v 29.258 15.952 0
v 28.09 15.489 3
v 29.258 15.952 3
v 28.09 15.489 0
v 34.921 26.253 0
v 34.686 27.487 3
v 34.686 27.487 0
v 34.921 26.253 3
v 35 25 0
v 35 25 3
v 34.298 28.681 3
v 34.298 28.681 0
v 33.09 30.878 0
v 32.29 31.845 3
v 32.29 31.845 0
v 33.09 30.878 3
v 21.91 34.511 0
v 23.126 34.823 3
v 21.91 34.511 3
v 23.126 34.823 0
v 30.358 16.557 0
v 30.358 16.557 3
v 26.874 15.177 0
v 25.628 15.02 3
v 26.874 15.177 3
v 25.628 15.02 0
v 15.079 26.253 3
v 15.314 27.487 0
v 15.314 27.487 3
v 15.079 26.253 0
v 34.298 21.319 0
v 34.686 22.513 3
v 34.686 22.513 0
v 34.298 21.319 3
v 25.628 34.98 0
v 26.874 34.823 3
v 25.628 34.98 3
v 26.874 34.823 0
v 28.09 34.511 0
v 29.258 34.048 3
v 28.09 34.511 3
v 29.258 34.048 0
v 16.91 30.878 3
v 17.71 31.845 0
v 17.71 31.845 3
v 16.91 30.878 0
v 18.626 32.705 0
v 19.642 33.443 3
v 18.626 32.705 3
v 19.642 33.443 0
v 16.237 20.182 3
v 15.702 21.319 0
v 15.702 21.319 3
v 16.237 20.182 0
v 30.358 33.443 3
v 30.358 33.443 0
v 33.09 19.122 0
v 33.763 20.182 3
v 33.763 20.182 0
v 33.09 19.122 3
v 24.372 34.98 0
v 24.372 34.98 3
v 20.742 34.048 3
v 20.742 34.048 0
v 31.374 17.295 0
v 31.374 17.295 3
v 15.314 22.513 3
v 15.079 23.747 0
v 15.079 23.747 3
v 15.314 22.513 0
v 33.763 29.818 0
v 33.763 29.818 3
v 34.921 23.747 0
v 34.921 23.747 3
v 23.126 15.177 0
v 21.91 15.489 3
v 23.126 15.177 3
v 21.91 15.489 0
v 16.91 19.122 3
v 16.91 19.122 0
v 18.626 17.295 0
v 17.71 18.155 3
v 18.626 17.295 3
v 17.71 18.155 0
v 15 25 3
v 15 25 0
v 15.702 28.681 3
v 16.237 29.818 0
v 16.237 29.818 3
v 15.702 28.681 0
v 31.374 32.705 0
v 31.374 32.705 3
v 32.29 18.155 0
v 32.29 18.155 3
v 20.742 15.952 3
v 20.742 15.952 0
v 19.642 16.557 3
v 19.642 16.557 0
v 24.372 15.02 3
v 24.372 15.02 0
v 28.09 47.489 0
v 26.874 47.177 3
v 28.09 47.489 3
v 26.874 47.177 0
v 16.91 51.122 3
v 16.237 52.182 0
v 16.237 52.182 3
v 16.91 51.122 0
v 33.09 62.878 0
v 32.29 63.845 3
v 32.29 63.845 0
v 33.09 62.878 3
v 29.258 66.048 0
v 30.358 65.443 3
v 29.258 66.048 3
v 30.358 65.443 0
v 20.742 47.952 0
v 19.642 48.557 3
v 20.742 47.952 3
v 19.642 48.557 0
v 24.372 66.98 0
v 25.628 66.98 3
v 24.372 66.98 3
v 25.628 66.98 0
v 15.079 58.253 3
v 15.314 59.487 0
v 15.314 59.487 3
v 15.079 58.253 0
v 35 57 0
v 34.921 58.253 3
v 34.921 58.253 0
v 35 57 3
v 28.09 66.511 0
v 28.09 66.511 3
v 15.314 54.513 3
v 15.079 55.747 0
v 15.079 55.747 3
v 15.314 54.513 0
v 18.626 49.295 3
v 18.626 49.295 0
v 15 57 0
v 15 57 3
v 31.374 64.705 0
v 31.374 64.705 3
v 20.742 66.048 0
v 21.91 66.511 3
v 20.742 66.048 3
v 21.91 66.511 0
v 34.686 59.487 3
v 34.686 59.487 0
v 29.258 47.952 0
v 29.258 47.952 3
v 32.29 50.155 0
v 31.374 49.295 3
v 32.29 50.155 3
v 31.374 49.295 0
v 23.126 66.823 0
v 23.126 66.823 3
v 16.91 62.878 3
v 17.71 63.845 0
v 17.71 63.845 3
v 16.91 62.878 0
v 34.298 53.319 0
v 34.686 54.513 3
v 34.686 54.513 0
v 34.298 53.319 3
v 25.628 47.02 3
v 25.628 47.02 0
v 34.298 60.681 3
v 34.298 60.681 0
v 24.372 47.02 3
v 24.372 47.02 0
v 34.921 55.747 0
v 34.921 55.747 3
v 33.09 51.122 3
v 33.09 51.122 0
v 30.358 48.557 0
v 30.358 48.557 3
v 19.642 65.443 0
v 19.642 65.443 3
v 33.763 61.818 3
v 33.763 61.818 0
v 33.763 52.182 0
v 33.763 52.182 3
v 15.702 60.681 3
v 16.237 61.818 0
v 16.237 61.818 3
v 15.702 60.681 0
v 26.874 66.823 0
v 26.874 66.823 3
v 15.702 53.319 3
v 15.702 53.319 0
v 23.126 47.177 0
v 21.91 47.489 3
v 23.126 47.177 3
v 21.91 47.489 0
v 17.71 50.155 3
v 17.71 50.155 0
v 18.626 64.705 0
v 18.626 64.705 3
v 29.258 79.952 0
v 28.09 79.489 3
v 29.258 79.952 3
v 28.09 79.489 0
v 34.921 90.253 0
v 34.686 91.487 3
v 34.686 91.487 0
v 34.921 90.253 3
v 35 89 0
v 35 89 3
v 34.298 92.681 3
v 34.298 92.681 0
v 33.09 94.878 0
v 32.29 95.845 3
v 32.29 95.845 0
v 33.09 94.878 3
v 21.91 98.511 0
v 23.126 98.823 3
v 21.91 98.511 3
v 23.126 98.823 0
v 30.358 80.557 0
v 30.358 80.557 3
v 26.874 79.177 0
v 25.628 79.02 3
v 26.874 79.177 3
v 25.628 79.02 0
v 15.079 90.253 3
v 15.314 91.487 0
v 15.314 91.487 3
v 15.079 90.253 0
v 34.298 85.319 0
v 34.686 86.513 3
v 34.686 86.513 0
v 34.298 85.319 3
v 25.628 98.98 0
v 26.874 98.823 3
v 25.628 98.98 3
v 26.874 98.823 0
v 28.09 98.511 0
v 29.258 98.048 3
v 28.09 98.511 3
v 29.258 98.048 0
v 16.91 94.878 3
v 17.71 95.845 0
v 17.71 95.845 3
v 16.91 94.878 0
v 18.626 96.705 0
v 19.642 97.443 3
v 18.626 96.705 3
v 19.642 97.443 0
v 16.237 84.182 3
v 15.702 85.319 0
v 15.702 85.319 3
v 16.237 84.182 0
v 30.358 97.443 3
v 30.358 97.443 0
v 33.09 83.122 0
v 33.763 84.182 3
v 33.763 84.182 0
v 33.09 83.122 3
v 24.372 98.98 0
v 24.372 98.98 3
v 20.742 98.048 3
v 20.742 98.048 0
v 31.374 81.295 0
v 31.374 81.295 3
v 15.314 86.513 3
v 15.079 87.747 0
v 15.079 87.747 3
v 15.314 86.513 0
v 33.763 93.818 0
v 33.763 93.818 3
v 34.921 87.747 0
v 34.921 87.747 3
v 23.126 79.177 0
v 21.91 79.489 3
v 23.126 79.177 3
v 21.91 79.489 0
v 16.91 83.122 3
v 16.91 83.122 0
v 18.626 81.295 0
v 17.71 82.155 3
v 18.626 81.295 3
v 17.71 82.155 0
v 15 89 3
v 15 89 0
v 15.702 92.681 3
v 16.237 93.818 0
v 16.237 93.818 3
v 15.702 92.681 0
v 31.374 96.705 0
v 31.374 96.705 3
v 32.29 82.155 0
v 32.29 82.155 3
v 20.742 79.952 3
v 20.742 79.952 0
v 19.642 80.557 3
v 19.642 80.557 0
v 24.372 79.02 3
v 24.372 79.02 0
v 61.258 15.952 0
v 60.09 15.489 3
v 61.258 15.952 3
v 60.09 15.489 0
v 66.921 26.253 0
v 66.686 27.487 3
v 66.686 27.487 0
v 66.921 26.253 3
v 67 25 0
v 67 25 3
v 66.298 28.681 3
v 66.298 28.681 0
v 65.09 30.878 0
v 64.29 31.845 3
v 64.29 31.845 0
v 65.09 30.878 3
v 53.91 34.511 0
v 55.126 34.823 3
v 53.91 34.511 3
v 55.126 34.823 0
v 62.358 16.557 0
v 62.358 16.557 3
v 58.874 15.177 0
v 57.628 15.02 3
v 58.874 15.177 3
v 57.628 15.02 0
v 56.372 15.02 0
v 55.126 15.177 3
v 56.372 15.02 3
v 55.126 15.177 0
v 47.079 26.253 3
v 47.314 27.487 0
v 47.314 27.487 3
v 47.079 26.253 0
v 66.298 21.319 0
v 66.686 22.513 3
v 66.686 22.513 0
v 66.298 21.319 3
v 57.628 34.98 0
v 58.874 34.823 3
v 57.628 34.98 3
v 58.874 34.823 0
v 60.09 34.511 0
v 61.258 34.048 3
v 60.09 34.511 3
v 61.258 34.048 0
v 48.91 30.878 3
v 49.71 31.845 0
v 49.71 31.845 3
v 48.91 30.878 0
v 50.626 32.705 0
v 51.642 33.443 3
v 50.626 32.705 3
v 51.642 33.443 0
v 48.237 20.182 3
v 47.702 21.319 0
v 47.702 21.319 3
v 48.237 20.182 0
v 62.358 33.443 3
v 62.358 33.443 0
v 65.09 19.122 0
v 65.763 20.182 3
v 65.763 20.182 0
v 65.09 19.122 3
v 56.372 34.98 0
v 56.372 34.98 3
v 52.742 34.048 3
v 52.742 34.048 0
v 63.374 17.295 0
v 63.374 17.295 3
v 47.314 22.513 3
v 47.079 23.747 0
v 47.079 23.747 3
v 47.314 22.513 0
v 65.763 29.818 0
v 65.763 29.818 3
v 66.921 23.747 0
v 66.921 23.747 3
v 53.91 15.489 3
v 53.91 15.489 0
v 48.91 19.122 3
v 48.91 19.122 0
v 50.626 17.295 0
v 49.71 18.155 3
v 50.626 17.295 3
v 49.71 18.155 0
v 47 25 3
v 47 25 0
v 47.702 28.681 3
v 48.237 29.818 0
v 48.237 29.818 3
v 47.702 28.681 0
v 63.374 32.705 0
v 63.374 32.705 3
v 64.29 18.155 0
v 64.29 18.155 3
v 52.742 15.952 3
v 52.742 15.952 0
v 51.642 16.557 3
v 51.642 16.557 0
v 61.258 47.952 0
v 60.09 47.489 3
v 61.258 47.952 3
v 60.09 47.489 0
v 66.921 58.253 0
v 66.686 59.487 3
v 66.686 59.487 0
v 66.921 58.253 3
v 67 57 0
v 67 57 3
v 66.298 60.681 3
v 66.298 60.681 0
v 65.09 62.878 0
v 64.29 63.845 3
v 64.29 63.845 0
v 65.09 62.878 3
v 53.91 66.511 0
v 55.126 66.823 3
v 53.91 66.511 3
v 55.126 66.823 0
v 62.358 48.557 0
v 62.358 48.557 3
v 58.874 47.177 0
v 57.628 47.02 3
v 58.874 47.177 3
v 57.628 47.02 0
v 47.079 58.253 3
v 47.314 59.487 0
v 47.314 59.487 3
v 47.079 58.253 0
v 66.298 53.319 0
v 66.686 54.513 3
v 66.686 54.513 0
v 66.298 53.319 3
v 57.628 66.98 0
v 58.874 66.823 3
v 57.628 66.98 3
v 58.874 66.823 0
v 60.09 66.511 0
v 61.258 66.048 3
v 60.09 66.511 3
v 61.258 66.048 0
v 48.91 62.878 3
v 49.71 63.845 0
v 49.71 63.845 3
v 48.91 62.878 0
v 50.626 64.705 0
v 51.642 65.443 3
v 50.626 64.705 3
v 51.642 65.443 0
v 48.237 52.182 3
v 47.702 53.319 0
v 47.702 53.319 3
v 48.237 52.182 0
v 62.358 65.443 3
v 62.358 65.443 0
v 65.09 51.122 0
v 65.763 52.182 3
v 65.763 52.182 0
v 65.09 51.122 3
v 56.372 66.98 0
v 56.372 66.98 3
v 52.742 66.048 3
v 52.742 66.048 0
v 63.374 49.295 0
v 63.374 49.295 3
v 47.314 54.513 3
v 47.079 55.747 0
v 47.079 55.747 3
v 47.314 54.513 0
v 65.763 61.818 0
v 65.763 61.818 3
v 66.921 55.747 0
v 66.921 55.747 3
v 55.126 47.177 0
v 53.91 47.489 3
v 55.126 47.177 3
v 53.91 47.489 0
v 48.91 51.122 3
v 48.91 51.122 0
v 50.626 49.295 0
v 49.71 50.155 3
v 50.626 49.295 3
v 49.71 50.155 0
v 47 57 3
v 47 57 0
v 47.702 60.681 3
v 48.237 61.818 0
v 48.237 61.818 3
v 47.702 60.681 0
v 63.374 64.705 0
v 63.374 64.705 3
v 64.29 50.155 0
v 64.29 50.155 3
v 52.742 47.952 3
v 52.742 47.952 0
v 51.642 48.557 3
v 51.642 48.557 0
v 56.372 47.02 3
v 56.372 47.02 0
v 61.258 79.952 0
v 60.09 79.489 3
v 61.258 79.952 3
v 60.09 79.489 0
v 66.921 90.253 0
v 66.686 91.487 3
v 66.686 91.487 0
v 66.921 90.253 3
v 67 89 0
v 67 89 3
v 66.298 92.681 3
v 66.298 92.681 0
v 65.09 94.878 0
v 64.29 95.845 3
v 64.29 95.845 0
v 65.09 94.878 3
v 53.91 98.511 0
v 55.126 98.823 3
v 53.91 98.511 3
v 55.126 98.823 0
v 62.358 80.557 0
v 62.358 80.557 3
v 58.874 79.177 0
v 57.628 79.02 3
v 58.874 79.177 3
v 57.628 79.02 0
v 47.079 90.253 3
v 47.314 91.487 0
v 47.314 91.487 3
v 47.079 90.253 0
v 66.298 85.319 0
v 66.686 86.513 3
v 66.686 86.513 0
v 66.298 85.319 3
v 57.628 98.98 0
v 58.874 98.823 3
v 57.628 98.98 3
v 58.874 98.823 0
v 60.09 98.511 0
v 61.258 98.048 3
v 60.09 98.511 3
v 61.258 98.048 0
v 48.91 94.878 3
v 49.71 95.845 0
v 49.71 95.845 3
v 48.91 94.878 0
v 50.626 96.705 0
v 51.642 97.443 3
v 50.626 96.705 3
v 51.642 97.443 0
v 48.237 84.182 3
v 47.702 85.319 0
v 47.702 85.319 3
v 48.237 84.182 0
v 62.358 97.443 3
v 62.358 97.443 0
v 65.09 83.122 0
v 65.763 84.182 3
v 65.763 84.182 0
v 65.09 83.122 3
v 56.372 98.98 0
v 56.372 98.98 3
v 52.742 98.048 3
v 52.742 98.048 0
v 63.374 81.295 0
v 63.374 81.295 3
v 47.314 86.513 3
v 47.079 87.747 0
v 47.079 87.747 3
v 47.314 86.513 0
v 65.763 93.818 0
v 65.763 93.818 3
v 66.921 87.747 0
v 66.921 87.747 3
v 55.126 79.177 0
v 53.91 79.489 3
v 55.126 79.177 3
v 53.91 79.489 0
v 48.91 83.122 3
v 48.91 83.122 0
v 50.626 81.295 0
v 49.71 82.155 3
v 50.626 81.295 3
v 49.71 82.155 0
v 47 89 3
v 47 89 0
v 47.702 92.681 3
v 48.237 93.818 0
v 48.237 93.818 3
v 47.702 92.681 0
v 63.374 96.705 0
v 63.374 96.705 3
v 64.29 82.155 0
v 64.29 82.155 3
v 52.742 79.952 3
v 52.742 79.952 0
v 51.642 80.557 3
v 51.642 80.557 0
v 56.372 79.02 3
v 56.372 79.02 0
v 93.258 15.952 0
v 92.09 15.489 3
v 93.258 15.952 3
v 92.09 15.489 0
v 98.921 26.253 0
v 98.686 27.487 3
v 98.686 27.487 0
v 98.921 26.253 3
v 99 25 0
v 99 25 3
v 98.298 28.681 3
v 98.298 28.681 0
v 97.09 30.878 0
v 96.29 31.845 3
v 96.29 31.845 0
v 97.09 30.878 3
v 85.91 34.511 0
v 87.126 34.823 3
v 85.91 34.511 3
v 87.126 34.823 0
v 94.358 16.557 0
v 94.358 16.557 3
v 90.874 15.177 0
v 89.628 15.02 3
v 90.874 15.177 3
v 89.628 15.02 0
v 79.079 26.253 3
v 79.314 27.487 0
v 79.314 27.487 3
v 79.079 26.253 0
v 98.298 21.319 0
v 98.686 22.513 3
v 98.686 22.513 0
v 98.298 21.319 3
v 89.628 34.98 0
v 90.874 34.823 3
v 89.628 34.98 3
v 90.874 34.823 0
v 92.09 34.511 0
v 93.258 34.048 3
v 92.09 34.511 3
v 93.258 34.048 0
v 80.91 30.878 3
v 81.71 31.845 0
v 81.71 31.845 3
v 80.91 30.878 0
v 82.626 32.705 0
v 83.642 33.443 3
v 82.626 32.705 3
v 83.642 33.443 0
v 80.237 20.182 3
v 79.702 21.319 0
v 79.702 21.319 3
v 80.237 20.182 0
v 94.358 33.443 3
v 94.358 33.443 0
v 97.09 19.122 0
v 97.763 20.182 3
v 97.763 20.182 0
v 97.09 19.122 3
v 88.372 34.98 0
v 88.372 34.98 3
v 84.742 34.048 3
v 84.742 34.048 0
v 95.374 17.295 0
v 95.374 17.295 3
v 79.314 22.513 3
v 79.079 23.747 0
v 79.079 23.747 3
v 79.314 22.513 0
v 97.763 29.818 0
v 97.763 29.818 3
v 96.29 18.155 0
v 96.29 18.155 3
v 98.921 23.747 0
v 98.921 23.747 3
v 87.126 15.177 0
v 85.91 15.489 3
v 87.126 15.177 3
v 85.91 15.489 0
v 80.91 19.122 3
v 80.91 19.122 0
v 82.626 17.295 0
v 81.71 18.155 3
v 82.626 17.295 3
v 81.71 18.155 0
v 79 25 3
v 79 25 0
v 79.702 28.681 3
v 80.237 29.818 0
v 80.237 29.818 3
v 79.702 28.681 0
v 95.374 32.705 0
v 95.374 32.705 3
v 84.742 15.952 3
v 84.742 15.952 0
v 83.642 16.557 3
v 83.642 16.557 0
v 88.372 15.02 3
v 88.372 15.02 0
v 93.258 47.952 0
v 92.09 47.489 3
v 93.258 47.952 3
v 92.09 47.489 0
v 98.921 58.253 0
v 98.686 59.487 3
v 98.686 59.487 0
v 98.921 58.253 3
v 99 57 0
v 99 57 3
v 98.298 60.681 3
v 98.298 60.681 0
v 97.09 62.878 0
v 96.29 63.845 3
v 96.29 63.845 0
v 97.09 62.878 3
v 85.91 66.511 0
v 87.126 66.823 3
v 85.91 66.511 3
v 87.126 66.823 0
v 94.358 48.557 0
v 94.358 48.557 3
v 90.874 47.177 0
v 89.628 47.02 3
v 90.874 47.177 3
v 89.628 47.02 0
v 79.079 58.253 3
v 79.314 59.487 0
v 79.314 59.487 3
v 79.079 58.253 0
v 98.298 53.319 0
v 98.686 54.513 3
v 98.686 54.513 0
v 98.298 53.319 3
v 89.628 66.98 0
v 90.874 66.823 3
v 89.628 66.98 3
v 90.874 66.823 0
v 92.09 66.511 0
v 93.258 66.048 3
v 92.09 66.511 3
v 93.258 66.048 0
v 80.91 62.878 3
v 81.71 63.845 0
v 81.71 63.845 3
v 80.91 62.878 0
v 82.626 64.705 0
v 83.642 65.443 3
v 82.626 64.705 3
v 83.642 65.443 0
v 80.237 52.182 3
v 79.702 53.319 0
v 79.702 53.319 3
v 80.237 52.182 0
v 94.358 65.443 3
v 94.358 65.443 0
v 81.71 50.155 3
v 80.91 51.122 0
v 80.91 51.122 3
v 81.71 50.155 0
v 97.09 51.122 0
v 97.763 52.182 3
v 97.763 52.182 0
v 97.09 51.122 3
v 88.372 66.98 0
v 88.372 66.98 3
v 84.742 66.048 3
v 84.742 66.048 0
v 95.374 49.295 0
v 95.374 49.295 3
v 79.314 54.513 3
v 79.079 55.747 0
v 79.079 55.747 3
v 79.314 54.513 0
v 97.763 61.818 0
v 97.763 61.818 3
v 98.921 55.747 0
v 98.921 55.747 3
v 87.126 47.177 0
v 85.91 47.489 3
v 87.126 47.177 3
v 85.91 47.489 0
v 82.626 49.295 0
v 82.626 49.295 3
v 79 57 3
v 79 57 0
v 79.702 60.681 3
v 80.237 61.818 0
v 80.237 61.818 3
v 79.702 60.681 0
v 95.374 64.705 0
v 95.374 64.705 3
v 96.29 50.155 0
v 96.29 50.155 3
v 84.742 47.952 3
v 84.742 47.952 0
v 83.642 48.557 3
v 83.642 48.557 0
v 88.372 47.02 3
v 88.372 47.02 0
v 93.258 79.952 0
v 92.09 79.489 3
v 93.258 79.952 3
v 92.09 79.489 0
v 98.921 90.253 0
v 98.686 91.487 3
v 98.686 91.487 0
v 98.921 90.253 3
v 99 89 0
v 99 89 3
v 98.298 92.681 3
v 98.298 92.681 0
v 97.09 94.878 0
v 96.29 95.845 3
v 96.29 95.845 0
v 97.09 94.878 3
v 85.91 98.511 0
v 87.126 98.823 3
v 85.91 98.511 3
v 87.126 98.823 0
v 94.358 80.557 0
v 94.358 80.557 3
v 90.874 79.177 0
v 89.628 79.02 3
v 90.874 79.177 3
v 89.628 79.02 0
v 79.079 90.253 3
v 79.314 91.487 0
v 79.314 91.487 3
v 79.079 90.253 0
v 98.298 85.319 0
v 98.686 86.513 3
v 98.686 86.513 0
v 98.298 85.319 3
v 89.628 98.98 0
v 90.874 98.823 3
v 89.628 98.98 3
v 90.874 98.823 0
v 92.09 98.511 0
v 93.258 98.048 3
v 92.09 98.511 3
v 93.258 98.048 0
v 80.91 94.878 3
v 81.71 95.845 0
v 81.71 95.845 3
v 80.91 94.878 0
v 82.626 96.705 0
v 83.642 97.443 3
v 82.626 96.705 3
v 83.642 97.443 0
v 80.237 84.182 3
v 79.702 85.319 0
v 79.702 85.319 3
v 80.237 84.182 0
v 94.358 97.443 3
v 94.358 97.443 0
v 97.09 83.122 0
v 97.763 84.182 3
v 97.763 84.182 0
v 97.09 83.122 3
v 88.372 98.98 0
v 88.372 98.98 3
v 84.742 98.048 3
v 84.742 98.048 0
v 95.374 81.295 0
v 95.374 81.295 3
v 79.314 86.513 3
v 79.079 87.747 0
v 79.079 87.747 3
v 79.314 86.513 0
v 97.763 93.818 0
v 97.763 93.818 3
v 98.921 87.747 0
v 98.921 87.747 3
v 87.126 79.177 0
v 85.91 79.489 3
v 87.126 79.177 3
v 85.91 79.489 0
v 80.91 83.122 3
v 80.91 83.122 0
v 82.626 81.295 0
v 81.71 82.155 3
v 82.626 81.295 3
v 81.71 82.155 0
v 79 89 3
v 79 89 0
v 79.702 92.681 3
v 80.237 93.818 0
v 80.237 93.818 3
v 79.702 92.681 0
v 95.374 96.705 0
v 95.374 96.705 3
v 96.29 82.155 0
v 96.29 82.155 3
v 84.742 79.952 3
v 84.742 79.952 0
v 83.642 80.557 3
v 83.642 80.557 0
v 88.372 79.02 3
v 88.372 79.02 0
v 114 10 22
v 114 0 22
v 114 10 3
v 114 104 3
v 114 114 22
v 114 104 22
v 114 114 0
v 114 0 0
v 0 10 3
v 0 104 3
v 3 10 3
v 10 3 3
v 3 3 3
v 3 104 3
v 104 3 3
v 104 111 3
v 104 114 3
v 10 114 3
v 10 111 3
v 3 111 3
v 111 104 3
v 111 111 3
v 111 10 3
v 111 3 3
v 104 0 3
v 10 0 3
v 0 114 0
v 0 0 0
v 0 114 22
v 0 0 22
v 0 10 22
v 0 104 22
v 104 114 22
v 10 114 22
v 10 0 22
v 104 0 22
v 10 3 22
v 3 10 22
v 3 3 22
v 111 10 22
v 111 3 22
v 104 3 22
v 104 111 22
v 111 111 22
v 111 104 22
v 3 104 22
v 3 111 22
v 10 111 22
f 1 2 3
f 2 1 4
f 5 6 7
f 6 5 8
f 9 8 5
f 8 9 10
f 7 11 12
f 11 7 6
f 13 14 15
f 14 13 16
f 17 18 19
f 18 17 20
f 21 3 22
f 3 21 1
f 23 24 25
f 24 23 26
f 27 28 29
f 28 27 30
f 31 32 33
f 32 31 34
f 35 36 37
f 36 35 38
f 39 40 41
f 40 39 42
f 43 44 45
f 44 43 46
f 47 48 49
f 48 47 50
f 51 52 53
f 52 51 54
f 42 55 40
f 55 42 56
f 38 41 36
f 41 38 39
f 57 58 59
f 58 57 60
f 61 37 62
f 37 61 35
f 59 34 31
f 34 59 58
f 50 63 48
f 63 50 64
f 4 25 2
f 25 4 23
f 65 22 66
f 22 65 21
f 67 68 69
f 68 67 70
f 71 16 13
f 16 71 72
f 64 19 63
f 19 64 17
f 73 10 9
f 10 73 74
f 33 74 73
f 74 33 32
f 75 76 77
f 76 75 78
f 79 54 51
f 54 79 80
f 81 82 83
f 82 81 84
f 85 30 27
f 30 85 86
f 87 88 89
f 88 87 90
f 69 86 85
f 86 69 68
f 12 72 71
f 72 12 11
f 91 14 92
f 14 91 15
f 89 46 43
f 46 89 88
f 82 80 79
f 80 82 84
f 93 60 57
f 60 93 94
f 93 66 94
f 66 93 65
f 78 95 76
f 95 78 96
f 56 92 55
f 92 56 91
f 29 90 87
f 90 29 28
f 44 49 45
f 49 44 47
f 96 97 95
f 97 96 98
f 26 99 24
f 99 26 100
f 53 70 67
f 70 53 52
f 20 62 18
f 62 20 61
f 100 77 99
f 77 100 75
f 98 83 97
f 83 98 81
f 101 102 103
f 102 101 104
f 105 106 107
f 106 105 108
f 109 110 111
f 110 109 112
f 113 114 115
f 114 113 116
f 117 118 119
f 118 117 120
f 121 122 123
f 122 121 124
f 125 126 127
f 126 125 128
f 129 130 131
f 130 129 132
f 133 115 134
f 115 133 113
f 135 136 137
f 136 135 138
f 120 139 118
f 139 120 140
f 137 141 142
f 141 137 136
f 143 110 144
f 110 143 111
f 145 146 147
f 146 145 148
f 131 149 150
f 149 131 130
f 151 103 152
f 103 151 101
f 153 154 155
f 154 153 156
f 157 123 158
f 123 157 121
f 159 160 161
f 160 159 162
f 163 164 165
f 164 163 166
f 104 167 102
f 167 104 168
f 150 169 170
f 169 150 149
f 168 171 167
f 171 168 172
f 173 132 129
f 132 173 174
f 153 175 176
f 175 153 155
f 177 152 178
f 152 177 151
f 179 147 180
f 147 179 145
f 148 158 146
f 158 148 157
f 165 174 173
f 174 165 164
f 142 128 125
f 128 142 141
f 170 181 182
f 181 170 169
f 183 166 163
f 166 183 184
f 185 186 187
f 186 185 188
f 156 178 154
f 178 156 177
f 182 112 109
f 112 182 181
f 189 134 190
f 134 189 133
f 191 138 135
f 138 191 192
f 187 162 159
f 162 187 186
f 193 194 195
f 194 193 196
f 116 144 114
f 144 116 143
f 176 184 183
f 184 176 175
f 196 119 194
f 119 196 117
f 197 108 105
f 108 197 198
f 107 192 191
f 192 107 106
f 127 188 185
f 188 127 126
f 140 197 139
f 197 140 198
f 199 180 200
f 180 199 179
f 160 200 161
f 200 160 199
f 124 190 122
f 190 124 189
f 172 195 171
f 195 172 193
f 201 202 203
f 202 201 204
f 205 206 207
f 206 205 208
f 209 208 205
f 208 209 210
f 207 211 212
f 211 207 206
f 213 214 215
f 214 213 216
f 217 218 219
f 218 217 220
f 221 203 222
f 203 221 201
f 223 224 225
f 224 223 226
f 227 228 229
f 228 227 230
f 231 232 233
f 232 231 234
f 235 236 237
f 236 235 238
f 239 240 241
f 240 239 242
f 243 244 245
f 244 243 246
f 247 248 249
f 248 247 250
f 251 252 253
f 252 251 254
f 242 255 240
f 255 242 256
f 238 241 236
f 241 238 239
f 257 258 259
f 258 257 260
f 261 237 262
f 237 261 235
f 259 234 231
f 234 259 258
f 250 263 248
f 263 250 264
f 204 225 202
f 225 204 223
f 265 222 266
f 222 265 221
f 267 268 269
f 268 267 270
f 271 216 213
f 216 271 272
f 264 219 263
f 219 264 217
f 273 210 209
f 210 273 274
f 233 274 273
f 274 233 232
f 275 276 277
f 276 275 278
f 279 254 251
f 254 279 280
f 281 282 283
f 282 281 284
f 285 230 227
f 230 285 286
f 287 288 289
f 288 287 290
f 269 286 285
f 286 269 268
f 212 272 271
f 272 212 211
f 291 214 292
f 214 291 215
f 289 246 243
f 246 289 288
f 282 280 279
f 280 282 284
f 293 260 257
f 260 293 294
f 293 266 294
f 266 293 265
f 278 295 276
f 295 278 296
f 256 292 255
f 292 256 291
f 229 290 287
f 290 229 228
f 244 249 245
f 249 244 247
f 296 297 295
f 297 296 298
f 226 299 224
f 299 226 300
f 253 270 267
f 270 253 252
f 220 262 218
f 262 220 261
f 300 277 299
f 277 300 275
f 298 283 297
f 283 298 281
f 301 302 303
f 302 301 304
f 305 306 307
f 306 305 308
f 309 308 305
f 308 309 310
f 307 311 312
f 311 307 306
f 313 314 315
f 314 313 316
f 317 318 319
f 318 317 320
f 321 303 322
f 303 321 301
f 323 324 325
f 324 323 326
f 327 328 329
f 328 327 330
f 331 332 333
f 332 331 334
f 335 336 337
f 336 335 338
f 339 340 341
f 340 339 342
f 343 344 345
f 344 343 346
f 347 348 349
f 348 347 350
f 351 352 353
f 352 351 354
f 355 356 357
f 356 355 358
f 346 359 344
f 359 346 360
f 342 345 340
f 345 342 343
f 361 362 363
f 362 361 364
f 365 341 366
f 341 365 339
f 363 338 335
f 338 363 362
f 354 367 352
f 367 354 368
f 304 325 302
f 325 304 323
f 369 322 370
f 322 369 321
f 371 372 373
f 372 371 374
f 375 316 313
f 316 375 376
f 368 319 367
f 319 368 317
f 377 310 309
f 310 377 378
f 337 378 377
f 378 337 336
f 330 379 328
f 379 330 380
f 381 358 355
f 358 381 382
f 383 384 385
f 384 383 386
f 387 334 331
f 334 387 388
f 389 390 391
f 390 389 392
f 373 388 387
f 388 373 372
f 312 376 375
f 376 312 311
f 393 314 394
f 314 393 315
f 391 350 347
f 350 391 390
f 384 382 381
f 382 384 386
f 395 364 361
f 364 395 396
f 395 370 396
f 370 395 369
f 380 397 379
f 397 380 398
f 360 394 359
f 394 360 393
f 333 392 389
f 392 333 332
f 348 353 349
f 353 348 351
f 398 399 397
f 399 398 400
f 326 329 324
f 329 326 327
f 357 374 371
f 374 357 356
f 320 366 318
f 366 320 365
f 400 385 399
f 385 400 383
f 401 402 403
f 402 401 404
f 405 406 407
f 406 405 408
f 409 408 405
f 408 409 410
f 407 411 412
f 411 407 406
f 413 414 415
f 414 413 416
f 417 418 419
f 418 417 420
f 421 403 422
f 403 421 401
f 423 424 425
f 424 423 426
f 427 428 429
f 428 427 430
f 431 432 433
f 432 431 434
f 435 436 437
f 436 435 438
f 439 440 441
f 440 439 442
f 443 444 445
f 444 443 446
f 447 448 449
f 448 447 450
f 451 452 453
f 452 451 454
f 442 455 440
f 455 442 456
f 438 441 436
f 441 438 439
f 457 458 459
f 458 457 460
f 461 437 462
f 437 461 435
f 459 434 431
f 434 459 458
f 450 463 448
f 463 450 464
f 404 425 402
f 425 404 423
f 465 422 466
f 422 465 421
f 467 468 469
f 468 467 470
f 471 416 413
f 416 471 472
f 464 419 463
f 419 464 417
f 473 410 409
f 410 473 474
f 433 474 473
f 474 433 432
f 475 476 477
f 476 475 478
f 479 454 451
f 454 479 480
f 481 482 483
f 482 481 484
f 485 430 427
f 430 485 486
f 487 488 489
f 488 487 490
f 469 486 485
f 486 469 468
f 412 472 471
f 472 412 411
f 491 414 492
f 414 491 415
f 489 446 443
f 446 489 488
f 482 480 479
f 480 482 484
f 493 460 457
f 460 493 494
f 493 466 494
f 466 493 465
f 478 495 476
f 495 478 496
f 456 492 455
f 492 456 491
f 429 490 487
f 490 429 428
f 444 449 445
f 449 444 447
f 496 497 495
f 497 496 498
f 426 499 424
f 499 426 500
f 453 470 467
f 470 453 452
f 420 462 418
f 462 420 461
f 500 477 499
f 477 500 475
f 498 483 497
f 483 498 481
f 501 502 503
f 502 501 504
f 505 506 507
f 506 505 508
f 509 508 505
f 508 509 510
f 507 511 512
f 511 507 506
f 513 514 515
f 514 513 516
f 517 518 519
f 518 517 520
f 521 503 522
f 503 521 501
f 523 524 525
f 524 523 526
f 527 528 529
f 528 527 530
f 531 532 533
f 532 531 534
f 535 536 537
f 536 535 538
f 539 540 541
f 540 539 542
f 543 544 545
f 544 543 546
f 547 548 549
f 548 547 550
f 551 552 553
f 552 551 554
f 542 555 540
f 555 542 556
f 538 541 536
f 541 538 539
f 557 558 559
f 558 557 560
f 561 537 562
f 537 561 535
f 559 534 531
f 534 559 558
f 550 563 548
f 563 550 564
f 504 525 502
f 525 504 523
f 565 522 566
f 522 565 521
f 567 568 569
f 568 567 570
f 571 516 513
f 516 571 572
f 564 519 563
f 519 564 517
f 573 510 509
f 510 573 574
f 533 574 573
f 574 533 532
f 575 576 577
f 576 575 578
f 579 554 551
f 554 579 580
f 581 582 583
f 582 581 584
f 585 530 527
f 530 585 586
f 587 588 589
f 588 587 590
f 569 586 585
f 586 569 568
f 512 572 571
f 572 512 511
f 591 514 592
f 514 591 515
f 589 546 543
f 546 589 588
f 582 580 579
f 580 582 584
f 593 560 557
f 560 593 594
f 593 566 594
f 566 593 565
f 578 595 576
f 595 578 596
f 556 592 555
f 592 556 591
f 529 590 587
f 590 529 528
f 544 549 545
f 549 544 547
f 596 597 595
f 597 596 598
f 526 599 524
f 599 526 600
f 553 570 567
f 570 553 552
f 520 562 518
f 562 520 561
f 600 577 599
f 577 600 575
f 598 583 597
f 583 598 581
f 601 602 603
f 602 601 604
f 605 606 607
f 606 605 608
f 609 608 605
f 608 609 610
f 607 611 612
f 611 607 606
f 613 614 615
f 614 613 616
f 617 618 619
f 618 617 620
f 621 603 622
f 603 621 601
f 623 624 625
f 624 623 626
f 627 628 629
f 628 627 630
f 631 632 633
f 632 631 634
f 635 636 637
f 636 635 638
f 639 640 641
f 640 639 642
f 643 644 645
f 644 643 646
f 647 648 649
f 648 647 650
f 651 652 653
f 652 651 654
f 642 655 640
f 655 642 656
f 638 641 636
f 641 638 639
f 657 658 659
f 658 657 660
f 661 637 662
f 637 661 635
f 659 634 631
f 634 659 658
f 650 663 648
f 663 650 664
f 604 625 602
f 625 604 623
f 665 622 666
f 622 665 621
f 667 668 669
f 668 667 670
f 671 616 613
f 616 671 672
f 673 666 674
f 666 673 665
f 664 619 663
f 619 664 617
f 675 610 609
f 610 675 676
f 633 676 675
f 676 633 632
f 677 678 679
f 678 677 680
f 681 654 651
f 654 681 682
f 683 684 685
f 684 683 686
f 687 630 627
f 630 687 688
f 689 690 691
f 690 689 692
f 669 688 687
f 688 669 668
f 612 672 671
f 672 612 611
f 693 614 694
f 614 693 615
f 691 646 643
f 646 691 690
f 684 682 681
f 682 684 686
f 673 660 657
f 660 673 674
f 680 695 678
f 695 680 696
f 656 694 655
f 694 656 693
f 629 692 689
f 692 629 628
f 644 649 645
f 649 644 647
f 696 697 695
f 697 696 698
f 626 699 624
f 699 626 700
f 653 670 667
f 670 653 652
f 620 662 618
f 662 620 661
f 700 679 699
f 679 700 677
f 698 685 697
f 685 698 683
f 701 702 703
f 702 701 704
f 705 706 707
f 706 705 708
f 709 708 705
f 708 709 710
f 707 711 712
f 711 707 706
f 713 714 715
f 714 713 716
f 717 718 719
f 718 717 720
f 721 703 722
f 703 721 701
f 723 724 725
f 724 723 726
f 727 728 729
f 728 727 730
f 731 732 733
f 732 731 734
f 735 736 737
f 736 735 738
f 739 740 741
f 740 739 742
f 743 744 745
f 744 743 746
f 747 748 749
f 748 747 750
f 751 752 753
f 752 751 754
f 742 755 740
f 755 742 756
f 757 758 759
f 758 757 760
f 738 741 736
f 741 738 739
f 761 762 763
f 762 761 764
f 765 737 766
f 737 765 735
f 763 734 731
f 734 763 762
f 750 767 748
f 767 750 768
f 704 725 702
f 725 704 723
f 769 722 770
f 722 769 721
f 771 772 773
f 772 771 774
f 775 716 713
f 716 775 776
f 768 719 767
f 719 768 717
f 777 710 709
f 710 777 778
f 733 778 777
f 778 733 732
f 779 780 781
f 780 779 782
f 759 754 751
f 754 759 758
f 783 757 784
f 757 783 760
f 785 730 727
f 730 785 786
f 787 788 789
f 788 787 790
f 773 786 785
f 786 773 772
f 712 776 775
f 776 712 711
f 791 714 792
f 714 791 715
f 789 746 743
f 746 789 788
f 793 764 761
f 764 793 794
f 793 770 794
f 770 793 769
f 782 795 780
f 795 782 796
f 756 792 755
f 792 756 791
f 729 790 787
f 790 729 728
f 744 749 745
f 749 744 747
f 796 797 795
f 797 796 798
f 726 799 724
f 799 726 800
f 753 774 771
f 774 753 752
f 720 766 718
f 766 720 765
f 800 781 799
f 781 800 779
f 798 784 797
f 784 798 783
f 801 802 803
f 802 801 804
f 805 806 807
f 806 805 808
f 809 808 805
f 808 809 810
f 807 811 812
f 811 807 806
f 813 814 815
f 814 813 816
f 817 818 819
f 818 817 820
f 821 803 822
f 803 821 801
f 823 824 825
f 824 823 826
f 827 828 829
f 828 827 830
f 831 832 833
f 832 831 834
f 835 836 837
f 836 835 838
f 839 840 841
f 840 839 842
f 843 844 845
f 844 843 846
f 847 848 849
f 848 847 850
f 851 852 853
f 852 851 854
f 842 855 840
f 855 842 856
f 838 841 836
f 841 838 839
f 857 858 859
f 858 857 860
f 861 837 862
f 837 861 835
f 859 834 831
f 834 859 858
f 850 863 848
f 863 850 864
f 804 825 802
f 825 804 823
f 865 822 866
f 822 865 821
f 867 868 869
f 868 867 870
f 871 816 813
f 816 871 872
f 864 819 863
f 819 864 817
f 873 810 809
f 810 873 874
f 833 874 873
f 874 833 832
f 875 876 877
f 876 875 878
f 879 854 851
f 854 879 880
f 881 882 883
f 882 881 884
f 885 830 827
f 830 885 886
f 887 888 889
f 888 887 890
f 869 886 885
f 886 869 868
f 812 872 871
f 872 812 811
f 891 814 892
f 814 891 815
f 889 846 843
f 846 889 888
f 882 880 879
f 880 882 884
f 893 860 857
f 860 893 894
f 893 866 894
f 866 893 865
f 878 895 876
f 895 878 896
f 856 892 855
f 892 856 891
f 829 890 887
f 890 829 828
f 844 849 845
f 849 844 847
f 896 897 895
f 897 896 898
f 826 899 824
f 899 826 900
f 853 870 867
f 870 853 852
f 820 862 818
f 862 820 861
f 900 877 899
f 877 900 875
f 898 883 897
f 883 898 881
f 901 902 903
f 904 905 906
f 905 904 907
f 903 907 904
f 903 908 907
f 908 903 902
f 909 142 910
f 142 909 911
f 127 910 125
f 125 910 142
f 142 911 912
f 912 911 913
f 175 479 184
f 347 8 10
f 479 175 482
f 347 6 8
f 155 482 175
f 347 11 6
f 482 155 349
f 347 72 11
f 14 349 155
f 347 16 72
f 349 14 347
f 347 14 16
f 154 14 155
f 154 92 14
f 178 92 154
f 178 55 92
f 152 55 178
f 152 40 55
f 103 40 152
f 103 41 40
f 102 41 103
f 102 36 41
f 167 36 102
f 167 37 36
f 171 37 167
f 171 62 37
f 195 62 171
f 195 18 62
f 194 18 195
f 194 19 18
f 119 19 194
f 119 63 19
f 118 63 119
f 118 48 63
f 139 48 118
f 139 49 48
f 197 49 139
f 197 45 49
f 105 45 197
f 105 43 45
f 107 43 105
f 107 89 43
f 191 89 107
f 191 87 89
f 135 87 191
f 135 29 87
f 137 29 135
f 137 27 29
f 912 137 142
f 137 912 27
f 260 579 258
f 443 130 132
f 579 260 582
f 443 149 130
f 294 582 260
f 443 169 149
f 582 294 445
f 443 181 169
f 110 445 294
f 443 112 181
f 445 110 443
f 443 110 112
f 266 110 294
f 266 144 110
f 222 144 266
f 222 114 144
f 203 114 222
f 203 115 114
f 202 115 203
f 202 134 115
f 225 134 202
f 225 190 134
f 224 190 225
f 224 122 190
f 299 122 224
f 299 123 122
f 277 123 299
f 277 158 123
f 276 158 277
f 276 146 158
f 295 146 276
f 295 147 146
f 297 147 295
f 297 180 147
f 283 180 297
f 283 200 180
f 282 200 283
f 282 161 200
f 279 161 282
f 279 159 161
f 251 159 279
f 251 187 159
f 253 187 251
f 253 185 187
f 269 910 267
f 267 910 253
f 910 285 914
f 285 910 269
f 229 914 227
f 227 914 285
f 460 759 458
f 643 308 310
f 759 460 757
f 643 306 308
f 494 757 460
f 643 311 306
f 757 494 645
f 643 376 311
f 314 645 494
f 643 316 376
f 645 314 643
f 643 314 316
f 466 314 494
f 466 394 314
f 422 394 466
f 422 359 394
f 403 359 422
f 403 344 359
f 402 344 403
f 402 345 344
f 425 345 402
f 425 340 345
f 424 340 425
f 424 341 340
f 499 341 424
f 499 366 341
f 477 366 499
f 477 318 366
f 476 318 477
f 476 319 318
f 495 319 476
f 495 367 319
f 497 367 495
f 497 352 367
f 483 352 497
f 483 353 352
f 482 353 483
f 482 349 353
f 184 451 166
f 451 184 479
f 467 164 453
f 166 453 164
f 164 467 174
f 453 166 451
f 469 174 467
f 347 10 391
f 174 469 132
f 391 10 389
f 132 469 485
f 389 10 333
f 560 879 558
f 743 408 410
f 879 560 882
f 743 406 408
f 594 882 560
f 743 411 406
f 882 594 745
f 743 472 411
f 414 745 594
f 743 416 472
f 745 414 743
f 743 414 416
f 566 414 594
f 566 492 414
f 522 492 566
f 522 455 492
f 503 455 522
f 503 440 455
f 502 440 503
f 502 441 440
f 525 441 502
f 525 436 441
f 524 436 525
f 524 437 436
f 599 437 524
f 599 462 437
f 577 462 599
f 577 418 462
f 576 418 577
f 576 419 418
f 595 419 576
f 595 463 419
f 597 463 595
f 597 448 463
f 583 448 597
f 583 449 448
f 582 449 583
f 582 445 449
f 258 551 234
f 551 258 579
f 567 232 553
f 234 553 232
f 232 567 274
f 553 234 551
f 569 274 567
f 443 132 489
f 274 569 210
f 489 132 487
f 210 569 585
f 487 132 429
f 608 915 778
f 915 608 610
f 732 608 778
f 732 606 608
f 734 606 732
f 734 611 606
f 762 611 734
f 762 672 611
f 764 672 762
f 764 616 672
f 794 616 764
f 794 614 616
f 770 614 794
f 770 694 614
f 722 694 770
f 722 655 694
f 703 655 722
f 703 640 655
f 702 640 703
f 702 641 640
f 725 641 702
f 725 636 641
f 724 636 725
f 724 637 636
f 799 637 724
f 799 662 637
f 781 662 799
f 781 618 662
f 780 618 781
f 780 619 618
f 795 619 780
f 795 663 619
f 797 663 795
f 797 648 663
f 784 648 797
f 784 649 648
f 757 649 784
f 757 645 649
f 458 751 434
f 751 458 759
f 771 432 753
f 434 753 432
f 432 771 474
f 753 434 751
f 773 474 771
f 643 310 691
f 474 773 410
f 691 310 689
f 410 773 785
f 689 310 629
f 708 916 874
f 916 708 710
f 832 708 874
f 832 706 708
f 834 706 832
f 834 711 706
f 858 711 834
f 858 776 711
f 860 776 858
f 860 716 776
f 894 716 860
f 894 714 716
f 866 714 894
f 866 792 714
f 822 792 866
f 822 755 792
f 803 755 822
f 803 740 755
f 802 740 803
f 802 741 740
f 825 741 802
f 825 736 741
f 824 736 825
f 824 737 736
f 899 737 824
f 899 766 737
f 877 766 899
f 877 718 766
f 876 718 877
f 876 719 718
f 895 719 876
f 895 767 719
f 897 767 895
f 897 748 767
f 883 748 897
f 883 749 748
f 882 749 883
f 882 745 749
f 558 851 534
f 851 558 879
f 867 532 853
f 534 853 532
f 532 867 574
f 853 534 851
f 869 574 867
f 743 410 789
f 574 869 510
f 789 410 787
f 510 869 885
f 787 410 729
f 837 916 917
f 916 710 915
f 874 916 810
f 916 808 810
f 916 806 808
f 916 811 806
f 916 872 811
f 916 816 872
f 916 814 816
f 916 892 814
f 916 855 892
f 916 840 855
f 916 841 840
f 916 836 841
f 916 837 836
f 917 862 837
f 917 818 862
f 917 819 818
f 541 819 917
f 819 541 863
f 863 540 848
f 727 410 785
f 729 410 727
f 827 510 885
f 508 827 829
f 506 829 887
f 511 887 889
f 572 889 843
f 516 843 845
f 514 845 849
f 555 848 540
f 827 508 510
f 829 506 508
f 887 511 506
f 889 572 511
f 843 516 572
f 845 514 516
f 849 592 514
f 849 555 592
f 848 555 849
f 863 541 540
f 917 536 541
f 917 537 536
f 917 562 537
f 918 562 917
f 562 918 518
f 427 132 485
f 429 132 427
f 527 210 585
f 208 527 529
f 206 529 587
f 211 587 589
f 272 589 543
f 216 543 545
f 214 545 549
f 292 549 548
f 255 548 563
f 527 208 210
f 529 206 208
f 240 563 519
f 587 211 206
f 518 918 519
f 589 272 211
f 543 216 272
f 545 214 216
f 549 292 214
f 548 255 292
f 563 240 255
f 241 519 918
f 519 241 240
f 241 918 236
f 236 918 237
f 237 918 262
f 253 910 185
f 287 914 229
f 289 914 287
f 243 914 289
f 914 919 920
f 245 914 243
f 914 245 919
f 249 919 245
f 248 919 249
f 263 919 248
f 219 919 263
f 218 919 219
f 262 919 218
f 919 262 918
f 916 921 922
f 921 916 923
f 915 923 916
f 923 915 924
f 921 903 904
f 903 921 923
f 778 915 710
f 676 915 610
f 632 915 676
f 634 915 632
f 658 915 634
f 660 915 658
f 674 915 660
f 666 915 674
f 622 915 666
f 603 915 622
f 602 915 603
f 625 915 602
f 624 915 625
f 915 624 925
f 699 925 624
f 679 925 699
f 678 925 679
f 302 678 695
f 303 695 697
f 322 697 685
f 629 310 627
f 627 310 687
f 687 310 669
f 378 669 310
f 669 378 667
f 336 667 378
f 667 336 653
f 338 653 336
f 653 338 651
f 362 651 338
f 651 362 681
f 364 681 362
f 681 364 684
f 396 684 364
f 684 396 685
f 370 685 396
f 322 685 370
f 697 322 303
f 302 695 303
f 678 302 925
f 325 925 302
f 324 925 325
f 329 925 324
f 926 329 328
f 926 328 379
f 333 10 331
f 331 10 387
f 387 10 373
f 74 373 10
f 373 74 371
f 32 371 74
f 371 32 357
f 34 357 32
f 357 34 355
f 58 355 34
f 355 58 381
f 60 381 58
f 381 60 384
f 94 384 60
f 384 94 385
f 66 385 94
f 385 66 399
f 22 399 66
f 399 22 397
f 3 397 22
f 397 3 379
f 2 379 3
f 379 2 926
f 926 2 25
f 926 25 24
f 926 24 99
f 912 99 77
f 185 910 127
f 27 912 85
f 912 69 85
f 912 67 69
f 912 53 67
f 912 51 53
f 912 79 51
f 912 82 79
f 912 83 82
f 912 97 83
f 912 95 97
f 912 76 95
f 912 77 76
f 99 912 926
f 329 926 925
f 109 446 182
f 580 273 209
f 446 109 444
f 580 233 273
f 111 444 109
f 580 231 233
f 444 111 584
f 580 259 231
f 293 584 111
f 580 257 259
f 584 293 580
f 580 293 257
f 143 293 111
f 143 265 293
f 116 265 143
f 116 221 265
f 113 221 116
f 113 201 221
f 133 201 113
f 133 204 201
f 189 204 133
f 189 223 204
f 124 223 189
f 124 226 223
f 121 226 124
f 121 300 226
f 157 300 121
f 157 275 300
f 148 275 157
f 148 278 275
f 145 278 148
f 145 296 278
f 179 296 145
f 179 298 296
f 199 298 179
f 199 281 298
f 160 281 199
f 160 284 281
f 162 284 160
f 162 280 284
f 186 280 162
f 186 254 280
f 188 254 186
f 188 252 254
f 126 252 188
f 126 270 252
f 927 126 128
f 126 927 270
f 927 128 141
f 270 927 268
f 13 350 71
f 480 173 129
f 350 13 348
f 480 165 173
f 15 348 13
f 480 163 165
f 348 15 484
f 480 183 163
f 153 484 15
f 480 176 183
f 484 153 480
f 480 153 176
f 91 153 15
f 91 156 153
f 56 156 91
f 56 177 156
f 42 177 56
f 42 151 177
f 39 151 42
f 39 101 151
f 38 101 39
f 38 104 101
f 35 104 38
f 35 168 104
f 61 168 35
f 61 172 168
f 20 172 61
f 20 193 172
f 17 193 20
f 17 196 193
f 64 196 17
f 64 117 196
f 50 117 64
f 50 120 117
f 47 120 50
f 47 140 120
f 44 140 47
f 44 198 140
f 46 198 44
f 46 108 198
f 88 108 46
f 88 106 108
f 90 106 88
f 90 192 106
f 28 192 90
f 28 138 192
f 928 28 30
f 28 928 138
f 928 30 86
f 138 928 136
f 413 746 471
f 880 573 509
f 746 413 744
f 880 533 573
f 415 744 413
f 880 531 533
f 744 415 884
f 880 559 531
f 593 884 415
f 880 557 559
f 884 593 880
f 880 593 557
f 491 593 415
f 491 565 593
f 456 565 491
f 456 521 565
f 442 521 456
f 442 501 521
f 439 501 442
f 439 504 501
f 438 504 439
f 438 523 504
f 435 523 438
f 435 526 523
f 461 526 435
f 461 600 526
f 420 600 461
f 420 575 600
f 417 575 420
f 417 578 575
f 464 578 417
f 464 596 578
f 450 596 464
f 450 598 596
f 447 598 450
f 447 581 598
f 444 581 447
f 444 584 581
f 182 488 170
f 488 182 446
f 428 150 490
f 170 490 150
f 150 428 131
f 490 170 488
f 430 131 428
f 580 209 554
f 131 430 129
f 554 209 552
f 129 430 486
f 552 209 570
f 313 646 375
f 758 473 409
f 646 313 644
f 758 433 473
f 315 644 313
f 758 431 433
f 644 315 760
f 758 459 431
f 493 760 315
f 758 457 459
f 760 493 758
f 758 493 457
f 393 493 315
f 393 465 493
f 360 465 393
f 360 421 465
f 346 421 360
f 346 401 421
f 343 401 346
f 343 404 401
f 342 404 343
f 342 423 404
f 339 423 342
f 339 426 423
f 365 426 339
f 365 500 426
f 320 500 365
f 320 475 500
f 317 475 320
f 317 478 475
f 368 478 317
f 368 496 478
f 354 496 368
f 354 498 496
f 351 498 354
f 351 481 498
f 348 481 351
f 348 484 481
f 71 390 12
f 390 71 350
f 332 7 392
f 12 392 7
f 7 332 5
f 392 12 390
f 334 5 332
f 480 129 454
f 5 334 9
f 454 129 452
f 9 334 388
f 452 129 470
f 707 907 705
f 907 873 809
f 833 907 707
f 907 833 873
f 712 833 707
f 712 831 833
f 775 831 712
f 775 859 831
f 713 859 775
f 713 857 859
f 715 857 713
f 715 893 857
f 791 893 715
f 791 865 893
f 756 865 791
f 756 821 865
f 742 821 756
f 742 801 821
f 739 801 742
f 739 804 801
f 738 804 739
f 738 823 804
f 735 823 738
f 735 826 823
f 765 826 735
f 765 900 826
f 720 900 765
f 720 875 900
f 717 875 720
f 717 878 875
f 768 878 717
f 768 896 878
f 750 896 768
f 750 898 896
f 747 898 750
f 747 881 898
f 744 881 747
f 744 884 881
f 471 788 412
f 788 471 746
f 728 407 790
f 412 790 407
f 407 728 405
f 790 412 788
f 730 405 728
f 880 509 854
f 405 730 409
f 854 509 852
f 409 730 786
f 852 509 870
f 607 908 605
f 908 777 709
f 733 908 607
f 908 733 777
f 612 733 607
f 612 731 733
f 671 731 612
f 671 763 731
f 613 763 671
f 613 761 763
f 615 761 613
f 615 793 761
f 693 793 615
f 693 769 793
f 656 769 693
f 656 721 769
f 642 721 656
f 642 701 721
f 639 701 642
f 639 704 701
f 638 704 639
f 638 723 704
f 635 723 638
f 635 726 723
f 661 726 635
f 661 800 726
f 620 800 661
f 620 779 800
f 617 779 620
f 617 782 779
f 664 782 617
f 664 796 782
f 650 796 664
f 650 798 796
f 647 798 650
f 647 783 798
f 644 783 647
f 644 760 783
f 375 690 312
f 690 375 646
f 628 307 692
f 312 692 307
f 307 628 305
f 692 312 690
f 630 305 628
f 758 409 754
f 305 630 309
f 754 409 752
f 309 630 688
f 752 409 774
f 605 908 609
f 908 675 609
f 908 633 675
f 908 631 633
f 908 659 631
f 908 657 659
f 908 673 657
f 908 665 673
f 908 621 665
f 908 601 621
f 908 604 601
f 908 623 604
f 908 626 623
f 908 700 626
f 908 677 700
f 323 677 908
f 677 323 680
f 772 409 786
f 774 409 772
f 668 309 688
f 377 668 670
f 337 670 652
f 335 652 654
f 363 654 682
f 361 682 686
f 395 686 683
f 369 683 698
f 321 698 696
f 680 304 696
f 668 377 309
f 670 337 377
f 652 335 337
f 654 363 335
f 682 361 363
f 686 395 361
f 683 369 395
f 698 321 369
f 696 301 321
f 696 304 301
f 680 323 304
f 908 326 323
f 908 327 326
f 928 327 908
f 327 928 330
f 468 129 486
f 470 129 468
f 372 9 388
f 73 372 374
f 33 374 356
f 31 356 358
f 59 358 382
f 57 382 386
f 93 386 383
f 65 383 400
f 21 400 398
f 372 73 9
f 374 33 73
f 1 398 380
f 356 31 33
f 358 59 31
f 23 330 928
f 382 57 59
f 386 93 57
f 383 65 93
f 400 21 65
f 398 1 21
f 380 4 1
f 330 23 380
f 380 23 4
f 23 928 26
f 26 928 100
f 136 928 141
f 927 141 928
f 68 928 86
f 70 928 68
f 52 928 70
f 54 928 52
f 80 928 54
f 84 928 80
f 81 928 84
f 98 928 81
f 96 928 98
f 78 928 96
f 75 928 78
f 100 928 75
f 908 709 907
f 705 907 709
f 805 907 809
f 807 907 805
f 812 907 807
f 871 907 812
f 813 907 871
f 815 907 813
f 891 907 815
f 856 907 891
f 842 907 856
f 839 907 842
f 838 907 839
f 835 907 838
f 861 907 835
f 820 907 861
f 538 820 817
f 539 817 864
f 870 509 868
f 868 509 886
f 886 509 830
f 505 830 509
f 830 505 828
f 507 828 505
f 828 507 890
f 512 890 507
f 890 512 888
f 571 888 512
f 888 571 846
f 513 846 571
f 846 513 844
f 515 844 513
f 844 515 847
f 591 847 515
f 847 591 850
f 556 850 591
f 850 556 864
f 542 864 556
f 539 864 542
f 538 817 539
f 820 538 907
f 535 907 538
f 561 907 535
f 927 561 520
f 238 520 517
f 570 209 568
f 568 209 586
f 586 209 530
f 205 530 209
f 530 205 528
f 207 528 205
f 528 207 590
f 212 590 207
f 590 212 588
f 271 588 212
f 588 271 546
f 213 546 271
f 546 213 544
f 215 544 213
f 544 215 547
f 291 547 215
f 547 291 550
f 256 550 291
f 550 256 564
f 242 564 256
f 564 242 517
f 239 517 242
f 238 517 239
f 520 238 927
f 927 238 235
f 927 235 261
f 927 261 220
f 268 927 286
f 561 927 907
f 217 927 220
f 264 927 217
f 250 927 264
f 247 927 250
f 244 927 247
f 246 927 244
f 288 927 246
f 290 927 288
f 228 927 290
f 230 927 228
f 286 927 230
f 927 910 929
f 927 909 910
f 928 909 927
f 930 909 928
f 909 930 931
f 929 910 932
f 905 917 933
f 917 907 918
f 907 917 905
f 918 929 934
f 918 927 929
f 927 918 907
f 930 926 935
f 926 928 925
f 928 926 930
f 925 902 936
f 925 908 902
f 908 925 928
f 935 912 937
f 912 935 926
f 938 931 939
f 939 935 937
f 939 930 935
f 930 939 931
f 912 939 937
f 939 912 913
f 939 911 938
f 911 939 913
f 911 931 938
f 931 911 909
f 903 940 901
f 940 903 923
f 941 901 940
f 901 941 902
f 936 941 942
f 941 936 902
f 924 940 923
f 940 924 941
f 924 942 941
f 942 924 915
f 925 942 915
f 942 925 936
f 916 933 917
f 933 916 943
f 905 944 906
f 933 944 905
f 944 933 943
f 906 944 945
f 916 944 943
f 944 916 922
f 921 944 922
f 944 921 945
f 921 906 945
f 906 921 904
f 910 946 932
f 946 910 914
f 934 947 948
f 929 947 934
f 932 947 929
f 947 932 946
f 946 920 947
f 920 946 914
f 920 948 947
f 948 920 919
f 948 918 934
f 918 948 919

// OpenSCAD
// Platte mit gleichmäßig verteilten Löchern
// Erstellt mit OpenSCAD

// Parameter
loch_durchmesser = 20;     // Durchmesser der Löcher in mm
loch_abstand = 12;         // Abstand zwischen den Löchern in mm
rand_abstand = 15;         // Abstand der Löcher zum Rand in mm
anzahl_loecher = 9;        // Anzahl der Löcher (3x3 Grid)
platten_dicke = 3;         // Dicke der Platte in mm
abstandhalter_laenge = 10; // Länge der Abstandhalter in mm
abstandhalter_breite = 3;  // Breite der Abstandhalter in mm

// Berechnung der Plattengröße
loecher_pro_reihe = sqrt(anzahl_loecher);  // 3 Löcher pro Reihe bei 9 Löchern
platten_breite = (loecher_pro_reihe * loch_durchmesser) + 
                 ((loecher_pro_reihe - 1) * loch_abstand) + 
                 (2 * rand_abstand);
platten_laenge = platten_breite;  // Quadratische Platte

echo("Plattengröße:", platten_breite, "x", platten_laenge, "x", platten_dicke);

// Modul für Eck-Abstandhalter
module eck_abstandhalter(breite, laenge, hoehe, dicke) {
    // Horizontaler Balken
    cube([laenge, dicke, hoehe]);
    // Vertikaler Balken
    cube([dicke, laenge, hoehe]);
}

// Hauptobjekt
union() {
    difference() {
        // Grundplatte
        cube([platten_breite, platten_laenge, platten_dicke]);
        
        // Löcher erstellen
        for (x = [0:loecher_pro_reihe-1]) {
            for (y = [0:loecher_pro_reihe-1]) {
                // Position berechnen
                pos_x = rand_abstand + (loch_durchmesser / 2) + 
                        x * (loch_durchmesser + loch_abstand);
                pos_y = rand_abstand + (loch_durchmesser / 2) + 
                        y * (loch_durchmesser + loch_abstand);
                
                // Loch erstellen (Zylinder durch die gesamte Platte)
                translate([pos_x, pos_y, -0.5])
                    cylinder(h = platten_dicke + 1, 
                            d = loch_durchmesser, 
                            $fn = 50);
            }
        }
    }
    
    // Abstandhalter in den Ecken
    // Ecke oben links
    translate([0, 0, platten_dicke])
        eck_abstandhalter(platten_breite, abstandhalter_laenge, 22 - platten_dicke, abstandhalter_breite);
    
    // Ecke oben rechts
    translate([platten_breite, 0, platten_dicke])
        rotate([0, 0, 90])
        eck_abstandhalter(platten_breite, abstandhalter_laenge, 22 - platten_dicke, abstandhalter_breite);
    
    // Ecke unten rechts
    translate([platten_breite, platten_laenge, platten_dicke])
        rotate([0, 0, 180])
        eck_abstandhalter(platten_breite, abstandhalter_laenge, 22 - platten_dicke, abstandhalter_breite);
    
    // Ecke unten links
    translate([0, platten_laenge, platten_dicke])
        rotate([0, 0, 270])
        eck_abstandhalter(platten_breite, abstandhalter_laenge, 22 - platten_dicke, abstandhalter_breite);
}
